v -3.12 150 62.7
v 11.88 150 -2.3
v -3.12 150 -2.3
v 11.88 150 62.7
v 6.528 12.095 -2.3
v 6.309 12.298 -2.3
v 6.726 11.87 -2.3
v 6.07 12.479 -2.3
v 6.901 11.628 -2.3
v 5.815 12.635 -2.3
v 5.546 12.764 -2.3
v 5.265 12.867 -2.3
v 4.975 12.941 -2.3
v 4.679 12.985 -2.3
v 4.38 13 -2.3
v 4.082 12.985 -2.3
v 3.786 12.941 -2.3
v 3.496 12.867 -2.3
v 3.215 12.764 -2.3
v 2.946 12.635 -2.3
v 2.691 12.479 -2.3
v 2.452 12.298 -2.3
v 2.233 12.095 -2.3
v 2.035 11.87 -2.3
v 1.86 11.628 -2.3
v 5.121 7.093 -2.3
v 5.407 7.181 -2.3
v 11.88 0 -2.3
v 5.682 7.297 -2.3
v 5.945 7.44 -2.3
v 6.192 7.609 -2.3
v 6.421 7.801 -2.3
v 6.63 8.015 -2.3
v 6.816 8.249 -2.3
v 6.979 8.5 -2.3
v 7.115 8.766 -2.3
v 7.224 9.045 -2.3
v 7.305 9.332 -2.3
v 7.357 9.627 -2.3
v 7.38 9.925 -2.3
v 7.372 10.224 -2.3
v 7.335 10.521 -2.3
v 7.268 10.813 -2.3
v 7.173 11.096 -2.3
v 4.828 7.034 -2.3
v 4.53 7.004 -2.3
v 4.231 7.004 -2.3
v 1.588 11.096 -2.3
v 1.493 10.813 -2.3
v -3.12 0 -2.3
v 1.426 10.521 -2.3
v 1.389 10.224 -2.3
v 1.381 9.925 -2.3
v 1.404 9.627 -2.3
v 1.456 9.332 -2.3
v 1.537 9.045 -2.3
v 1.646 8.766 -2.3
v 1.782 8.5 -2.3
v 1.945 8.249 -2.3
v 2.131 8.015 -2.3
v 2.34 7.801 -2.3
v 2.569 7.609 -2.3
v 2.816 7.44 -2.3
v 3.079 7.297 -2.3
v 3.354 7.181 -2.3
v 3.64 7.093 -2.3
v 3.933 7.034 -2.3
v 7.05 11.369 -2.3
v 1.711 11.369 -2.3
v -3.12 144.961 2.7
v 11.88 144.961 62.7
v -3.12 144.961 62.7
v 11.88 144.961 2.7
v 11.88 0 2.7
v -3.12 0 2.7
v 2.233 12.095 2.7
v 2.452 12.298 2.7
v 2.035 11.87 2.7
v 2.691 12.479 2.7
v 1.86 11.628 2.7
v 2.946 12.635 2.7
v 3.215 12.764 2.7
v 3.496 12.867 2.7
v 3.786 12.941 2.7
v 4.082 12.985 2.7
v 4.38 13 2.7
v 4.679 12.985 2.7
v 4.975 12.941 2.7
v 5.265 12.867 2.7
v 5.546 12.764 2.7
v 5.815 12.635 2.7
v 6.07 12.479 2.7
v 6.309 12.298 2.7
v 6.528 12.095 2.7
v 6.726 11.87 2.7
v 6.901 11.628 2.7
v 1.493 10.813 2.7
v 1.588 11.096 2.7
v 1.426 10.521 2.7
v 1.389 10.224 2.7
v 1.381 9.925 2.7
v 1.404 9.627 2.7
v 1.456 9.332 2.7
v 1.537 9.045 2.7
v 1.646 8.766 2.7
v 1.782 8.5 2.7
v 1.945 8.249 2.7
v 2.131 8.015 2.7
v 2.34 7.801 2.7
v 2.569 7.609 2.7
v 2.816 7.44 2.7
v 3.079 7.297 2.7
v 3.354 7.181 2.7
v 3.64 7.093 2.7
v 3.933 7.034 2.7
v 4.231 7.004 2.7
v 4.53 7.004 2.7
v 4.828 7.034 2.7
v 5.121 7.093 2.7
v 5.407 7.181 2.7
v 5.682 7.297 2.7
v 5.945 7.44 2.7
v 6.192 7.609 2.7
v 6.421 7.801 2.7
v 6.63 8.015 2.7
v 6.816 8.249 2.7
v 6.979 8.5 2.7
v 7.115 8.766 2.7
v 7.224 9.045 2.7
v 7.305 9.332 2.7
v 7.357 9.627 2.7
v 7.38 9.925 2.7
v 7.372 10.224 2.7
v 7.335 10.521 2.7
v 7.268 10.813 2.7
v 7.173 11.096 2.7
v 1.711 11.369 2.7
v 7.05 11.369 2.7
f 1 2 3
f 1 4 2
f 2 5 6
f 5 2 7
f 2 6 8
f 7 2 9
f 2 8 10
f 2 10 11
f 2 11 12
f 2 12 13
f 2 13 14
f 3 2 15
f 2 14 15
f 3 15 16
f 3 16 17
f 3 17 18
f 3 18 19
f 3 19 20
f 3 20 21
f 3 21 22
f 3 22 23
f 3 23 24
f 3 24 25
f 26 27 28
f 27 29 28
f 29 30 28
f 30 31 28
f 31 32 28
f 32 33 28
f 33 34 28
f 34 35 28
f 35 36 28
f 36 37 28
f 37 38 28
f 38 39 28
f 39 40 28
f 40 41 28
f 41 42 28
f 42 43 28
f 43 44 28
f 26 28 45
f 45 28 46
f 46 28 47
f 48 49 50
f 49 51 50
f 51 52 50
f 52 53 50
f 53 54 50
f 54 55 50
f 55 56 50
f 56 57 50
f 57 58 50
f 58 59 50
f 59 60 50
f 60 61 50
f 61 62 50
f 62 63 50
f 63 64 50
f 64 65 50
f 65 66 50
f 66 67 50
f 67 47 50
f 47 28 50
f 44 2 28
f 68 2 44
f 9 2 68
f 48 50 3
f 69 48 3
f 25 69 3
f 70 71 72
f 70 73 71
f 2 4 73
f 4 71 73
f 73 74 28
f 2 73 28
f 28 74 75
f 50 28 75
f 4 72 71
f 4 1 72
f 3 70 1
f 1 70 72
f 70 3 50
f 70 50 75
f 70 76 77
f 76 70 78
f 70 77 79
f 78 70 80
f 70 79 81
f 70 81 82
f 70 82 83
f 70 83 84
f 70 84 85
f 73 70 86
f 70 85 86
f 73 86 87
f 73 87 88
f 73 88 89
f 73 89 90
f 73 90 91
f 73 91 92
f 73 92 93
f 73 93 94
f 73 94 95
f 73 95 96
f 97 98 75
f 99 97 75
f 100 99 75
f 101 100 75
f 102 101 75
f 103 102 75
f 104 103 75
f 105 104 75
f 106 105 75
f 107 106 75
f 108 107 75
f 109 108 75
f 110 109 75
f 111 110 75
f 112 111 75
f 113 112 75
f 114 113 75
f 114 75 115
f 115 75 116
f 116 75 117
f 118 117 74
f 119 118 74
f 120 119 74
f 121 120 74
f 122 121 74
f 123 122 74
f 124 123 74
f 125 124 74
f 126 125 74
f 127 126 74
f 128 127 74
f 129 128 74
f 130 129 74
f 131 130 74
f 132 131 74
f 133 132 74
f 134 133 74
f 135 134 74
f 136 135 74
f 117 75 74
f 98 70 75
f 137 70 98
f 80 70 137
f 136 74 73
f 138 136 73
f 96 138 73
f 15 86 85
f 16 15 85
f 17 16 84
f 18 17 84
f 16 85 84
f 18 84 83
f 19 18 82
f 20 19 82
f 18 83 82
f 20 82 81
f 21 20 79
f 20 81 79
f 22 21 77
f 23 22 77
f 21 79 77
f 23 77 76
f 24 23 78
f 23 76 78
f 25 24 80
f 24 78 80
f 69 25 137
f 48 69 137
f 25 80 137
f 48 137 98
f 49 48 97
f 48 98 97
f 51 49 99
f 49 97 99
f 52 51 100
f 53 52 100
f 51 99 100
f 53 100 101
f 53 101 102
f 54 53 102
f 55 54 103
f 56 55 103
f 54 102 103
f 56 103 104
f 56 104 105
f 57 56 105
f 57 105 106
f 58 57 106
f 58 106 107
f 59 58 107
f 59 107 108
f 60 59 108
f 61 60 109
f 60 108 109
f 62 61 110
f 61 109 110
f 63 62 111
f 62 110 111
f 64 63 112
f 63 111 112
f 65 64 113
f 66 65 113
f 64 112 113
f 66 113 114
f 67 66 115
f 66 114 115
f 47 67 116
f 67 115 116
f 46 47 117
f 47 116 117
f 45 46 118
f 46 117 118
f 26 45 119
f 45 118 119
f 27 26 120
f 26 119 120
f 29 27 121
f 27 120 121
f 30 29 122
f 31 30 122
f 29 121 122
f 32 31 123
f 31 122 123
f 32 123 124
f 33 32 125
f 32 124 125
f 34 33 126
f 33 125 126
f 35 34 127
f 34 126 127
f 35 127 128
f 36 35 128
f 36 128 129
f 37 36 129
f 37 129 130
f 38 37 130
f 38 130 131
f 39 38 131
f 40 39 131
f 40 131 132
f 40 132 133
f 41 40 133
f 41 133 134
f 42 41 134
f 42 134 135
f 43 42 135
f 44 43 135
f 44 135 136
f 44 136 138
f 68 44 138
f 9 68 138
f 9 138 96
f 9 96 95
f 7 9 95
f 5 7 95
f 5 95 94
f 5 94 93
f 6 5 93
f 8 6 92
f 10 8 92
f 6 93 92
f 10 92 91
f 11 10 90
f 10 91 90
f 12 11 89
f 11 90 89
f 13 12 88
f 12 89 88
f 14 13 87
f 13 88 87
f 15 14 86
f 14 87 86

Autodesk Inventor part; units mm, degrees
ref_plane "YZ Plane" through (0, 0, 0) normal (1, 0, 0) x (0, 1, 0)
ref_plane "XZ Plane" through (0, 0, 0) normal (0, 1, 0) x (-1, 0, 0)
ref_plane "XY Plane" through (0, 0, 0) normal (0, 0, 1) x (1, 0, 0)
sketch "Sketch1" plane through (0, 0, 0) normal (0, 1, 0) x (-1, 0, 0)
  point P0 (0, 0)
sketch "Sketch2" plane through (0, 0, 0) normal (0, 1, 0) x (-1, 0, 0)
  line L0 (3.1195, 2.6996) -> (-11.8805, 2.6996)
  line L1 (-11.8805, 2.6996) -> (-11.8805, -2.3004)
  line L2 (-11.8805, -2.3004) -> (3.1195, -2.3004)
  line L3 (3.1195, -2.3004) -> (3.1195, 2.6996)
  point P0 (0, 0)
  dimension "d0" = 15
  dimension "d1" = 5
extrude "Extrusion1" add sketch "Sketch2" along normal blind 150
sketch "Sketch3" plane through (-3.1195, 0, 2.6996) normal (0, 0, 1) x (1, 0, 0)
  line L0 (15, 150) -> (0, 150) projected
  line L1 (15, 0) -> (15, 150) projected
  line L2 (0, 150) -> (15, 150)
  line L3 (15, 150) -> (15, 144.9614)
  line L4 (15, 144.9614) -> (0, 144.9614)
  line L5 (0, 144.9614) -> (0, 150)
  point P0 (3.1195, 0)
extrude "Extrusion2" add sketch "Sketch3" along normal blind 60
sketch "Sketch4" plane through (11.8805, 0, -2.3004) normal (0, 0, -1) x (-1, 0, 0)
  line L0 (0, 0) -> (15, 0) projected
  line L1 (0, 0) -> (15, 0) projected
  line L2 (15, 0) -> (15, 150) projected
  line L3 (0, 150) -> (15, 150) projected
  line L4 (0, 0) -> (0, 150) projected
  point P0 (11.8805, 0)
sketch "Sketch5" plane through (11.8805, 0, -2.3004) normal (0, 0, -1) x (-1, 0, 0)
  circle A0 centre (7.5, 10) radius 3 construction
  point P0 (11.8805, 0)
  dimension "d6" = 6
hole "Hole1" at (4.3805, 10, -2.3004) direction (0, 0, 1) diameter 6 end through all
